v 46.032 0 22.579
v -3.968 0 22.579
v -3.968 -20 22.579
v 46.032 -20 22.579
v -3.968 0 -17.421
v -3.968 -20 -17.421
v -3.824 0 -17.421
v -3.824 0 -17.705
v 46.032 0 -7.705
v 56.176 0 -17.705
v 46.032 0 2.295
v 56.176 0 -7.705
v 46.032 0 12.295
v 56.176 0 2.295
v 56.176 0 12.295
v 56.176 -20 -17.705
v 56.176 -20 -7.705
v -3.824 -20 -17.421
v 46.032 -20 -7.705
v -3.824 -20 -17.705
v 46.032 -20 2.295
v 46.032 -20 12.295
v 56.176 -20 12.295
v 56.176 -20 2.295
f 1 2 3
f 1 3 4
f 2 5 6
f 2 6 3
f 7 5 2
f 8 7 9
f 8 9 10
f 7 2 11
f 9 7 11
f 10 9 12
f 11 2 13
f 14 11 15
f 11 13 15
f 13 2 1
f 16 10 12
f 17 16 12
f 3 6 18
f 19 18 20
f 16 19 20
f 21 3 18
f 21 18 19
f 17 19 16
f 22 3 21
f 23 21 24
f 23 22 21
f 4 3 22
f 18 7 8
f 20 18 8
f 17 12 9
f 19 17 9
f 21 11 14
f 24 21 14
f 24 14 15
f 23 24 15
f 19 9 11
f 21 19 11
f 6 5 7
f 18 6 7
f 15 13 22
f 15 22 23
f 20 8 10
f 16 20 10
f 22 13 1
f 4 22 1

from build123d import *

# Parameters (mm, degrees)
F0_W     = 50
F0_H     = 40
F2_DEPTH = 20
F1_W     = 20
F1_H     = 10
F3_DEPTH = 20
F4_DEPTH = 20


with BuildPart() as f2:
    # F0 (on Front) → F2 (new body)
    with BuildSketch(Plane.XZ):
        with Locations((21.031922, 2.578686)):
            Rectangle(F0_W, F0_H)
    extrude(amount=F2_DEPTH)

    # F1 (on Front) → F3 (join)
    with BuildSketch(Plane.XZ):
        with Locations((46.17581, 7.295414)):
            Rectangle(F1_W, F1_H)
    extrude(amount=F3_DEPTH)

    # F1 (on Front) → F4 (join)
    with BuildSketch(Plane.XZ):
        Polygon((36.17581, -7.704586), (-3.82419, -7.704586), (-3.82419, -17.704586), (56.17581, -17.704586), (56.17581, -7.704586), align=None)
    extrude(amount=F4_DEPTH)


solid = f2.part
